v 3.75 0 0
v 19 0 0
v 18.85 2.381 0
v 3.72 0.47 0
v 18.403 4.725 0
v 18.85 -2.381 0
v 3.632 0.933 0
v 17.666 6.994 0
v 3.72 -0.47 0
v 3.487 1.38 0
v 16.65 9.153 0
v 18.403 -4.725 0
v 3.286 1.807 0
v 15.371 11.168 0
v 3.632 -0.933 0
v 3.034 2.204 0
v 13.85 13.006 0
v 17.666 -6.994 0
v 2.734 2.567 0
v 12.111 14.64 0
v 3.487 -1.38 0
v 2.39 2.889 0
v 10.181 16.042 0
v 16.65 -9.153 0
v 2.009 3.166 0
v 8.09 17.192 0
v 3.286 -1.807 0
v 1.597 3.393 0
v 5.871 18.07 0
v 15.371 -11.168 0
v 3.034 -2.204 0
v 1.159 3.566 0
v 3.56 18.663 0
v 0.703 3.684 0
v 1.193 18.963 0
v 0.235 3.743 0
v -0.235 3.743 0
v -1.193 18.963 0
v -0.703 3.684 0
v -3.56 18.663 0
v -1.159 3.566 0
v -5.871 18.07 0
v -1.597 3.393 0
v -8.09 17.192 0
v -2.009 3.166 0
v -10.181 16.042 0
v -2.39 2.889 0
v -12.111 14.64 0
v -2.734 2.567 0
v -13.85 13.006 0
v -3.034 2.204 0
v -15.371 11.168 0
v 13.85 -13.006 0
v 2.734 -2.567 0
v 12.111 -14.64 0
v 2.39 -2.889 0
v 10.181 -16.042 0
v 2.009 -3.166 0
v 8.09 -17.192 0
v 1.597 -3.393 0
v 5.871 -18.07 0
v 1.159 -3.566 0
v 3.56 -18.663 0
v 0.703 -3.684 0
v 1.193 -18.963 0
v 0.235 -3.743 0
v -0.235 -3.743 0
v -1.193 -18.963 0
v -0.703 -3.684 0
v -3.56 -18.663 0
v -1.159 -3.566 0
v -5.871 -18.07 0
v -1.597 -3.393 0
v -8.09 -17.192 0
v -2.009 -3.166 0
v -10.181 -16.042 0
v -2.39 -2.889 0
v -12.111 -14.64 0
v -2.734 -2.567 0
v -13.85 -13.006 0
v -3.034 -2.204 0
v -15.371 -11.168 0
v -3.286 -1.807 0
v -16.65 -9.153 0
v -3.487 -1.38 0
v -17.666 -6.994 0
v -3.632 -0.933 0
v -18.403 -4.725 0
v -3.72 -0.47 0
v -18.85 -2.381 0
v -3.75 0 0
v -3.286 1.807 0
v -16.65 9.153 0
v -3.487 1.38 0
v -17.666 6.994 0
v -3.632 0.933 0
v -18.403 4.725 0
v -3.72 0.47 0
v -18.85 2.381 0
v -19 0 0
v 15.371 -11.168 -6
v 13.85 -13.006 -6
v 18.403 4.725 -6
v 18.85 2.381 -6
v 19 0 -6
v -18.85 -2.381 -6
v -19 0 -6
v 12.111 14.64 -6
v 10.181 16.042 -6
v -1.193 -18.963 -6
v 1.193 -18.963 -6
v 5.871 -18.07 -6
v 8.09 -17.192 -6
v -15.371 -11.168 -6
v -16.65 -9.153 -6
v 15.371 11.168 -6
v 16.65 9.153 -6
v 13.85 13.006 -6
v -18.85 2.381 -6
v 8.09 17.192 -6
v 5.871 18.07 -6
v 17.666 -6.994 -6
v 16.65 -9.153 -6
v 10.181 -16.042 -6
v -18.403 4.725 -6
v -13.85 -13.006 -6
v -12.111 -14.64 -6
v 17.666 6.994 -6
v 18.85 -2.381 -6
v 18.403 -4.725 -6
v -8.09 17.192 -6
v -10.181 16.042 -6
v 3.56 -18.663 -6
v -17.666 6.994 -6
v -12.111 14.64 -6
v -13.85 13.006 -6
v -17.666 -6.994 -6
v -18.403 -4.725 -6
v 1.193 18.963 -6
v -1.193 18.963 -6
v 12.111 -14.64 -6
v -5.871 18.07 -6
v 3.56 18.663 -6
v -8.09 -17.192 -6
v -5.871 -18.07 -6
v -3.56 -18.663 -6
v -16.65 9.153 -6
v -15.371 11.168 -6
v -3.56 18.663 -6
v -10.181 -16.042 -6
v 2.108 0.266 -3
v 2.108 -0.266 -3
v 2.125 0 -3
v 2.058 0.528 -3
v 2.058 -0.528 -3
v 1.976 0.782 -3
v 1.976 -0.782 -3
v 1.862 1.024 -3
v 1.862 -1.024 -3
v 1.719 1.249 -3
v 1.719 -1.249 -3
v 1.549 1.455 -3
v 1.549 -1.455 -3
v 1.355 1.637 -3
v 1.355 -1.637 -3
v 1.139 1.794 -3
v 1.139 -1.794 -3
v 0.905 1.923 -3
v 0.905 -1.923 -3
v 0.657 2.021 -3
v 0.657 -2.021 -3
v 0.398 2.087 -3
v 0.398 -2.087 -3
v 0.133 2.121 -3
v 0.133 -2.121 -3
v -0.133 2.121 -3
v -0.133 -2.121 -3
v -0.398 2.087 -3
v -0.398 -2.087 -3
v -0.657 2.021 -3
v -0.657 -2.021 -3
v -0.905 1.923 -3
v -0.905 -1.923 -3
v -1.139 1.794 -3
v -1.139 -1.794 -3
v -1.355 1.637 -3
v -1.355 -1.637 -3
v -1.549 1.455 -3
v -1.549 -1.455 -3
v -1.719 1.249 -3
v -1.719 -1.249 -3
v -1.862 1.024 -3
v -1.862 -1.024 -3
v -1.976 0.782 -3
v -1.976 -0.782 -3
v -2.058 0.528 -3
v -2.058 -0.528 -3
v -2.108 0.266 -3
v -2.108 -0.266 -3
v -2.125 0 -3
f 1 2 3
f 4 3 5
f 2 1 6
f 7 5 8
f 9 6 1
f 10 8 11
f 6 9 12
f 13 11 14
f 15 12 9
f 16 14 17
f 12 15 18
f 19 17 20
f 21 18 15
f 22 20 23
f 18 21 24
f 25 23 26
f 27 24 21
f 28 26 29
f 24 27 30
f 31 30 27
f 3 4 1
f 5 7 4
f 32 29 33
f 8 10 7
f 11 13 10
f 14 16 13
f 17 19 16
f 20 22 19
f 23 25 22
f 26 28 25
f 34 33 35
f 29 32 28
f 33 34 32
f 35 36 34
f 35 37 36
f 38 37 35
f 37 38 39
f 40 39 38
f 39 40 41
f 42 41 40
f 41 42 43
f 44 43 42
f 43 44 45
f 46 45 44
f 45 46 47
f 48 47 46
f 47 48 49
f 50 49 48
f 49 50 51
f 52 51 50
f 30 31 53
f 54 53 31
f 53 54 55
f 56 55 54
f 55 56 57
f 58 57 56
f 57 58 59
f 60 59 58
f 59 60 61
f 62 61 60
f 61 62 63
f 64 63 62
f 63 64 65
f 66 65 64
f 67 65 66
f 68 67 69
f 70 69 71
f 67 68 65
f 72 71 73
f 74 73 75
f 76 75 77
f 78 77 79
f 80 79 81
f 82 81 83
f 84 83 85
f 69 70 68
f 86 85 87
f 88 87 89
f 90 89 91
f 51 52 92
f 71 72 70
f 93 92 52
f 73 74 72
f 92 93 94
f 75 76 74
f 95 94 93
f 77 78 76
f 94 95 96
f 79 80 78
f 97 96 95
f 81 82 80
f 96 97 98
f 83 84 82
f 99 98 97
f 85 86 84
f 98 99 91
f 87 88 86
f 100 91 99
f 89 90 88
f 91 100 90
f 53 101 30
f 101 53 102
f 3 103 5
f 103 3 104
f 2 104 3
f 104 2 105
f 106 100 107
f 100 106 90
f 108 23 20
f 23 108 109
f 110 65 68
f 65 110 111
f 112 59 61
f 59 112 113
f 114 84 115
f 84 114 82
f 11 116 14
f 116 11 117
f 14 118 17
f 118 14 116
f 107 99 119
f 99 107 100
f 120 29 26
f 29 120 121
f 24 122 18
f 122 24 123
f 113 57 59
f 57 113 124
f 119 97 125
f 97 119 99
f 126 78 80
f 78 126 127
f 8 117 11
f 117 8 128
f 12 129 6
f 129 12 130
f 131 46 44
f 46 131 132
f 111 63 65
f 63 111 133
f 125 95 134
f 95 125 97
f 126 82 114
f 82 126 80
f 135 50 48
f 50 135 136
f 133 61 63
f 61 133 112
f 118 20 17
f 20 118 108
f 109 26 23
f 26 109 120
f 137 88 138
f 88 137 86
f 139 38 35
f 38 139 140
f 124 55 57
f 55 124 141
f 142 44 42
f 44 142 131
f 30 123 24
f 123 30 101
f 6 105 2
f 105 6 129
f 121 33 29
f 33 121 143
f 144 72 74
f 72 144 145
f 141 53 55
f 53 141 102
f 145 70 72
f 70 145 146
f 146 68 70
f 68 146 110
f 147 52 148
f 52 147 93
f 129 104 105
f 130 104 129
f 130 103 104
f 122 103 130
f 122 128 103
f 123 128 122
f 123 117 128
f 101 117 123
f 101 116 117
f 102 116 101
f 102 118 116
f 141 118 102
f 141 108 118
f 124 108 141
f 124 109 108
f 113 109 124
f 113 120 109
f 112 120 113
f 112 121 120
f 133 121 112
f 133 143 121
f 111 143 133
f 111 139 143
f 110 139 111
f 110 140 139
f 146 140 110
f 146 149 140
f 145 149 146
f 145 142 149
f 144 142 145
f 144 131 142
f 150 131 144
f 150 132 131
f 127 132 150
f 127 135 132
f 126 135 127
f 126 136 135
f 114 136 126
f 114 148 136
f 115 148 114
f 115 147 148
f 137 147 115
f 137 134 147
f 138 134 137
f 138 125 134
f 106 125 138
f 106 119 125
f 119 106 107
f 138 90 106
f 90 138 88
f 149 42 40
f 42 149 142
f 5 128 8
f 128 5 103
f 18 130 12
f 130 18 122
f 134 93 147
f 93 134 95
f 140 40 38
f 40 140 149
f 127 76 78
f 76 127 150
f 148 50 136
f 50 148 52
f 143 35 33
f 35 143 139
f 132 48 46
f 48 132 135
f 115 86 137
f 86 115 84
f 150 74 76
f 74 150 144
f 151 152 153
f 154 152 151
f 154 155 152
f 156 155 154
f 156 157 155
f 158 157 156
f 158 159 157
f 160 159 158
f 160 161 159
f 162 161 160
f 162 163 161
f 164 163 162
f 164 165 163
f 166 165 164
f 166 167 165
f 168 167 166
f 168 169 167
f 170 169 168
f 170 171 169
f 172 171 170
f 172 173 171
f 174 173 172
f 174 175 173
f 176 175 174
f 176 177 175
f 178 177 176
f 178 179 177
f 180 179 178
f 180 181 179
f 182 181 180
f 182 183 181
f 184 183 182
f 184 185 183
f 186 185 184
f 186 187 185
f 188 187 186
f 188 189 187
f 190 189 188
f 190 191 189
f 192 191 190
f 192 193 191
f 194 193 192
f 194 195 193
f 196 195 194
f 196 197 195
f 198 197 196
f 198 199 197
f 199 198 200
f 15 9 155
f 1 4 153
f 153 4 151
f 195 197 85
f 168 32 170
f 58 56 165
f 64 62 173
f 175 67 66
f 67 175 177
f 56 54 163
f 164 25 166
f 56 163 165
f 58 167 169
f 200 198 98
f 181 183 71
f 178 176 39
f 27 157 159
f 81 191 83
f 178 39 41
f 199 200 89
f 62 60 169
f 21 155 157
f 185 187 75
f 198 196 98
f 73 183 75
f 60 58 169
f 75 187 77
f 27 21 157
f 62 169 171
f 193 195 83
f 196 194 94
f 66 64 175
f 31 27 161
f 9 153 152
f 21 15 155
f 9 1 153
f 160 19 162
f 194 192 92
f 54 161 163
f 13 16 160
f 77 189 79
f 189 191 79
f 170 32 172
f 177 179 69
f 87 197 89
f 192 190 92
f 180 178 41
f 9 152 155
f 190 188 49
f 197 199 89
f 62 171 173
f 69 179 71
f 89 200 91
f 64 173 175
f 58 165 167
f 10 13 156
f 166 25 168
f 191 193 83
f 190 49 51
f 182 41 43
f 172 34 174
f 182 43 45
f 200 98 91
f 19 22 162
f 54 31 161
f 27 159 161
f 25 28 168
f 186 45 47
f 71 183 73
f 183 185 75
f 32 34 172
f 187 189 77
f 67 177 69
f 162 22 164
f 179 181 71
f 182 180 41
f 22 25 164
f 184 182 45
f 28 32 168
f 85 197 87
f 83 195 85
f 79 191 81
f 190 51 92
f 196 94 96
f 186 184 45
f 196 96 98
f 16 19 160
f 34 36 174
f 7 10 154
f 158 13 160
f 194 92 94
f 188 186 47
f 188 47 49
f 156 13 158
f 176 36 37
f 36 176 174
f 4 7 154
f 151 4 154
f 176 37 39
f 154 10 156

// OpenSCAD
$fn = 50;


difference() {
	union() {
		translate(v = [0, 0, -3.0000000000]) {
			cylinder(h = 3, r = 10.0000000000);
		}
		translate(v = [0, 0, -6.0000000000]) {
			cylinder(h = 6, r = 19.0000000000);
		}
	}
	union() {
		translate(v = [0, 0, 0]) {
			rotate(a = [0, 0, 0]) {
				difference() {
					union() {
						#translate(v = [0, 0, -3.0000000000]) {
							cylinder(h = 3, r = 2.0000000000);
						}
						#translate(v = [0, 0, -3]) {
							cylinder(h = 3, r = 10.0000000000, r1 = 2.1250000000, r2 = 3.7500000000);
						}
						#translate(v = [0, 0, -3.0000000000]) {
							cylinder(h = 3, r = 2.1250000000);
						}
						#translate(v = [0, 0, -3.0000000000]) {
							cylinder(h = 3, r = 2.0000000000);
						}
					}
					union();
				}
			}
		}
	}
}
